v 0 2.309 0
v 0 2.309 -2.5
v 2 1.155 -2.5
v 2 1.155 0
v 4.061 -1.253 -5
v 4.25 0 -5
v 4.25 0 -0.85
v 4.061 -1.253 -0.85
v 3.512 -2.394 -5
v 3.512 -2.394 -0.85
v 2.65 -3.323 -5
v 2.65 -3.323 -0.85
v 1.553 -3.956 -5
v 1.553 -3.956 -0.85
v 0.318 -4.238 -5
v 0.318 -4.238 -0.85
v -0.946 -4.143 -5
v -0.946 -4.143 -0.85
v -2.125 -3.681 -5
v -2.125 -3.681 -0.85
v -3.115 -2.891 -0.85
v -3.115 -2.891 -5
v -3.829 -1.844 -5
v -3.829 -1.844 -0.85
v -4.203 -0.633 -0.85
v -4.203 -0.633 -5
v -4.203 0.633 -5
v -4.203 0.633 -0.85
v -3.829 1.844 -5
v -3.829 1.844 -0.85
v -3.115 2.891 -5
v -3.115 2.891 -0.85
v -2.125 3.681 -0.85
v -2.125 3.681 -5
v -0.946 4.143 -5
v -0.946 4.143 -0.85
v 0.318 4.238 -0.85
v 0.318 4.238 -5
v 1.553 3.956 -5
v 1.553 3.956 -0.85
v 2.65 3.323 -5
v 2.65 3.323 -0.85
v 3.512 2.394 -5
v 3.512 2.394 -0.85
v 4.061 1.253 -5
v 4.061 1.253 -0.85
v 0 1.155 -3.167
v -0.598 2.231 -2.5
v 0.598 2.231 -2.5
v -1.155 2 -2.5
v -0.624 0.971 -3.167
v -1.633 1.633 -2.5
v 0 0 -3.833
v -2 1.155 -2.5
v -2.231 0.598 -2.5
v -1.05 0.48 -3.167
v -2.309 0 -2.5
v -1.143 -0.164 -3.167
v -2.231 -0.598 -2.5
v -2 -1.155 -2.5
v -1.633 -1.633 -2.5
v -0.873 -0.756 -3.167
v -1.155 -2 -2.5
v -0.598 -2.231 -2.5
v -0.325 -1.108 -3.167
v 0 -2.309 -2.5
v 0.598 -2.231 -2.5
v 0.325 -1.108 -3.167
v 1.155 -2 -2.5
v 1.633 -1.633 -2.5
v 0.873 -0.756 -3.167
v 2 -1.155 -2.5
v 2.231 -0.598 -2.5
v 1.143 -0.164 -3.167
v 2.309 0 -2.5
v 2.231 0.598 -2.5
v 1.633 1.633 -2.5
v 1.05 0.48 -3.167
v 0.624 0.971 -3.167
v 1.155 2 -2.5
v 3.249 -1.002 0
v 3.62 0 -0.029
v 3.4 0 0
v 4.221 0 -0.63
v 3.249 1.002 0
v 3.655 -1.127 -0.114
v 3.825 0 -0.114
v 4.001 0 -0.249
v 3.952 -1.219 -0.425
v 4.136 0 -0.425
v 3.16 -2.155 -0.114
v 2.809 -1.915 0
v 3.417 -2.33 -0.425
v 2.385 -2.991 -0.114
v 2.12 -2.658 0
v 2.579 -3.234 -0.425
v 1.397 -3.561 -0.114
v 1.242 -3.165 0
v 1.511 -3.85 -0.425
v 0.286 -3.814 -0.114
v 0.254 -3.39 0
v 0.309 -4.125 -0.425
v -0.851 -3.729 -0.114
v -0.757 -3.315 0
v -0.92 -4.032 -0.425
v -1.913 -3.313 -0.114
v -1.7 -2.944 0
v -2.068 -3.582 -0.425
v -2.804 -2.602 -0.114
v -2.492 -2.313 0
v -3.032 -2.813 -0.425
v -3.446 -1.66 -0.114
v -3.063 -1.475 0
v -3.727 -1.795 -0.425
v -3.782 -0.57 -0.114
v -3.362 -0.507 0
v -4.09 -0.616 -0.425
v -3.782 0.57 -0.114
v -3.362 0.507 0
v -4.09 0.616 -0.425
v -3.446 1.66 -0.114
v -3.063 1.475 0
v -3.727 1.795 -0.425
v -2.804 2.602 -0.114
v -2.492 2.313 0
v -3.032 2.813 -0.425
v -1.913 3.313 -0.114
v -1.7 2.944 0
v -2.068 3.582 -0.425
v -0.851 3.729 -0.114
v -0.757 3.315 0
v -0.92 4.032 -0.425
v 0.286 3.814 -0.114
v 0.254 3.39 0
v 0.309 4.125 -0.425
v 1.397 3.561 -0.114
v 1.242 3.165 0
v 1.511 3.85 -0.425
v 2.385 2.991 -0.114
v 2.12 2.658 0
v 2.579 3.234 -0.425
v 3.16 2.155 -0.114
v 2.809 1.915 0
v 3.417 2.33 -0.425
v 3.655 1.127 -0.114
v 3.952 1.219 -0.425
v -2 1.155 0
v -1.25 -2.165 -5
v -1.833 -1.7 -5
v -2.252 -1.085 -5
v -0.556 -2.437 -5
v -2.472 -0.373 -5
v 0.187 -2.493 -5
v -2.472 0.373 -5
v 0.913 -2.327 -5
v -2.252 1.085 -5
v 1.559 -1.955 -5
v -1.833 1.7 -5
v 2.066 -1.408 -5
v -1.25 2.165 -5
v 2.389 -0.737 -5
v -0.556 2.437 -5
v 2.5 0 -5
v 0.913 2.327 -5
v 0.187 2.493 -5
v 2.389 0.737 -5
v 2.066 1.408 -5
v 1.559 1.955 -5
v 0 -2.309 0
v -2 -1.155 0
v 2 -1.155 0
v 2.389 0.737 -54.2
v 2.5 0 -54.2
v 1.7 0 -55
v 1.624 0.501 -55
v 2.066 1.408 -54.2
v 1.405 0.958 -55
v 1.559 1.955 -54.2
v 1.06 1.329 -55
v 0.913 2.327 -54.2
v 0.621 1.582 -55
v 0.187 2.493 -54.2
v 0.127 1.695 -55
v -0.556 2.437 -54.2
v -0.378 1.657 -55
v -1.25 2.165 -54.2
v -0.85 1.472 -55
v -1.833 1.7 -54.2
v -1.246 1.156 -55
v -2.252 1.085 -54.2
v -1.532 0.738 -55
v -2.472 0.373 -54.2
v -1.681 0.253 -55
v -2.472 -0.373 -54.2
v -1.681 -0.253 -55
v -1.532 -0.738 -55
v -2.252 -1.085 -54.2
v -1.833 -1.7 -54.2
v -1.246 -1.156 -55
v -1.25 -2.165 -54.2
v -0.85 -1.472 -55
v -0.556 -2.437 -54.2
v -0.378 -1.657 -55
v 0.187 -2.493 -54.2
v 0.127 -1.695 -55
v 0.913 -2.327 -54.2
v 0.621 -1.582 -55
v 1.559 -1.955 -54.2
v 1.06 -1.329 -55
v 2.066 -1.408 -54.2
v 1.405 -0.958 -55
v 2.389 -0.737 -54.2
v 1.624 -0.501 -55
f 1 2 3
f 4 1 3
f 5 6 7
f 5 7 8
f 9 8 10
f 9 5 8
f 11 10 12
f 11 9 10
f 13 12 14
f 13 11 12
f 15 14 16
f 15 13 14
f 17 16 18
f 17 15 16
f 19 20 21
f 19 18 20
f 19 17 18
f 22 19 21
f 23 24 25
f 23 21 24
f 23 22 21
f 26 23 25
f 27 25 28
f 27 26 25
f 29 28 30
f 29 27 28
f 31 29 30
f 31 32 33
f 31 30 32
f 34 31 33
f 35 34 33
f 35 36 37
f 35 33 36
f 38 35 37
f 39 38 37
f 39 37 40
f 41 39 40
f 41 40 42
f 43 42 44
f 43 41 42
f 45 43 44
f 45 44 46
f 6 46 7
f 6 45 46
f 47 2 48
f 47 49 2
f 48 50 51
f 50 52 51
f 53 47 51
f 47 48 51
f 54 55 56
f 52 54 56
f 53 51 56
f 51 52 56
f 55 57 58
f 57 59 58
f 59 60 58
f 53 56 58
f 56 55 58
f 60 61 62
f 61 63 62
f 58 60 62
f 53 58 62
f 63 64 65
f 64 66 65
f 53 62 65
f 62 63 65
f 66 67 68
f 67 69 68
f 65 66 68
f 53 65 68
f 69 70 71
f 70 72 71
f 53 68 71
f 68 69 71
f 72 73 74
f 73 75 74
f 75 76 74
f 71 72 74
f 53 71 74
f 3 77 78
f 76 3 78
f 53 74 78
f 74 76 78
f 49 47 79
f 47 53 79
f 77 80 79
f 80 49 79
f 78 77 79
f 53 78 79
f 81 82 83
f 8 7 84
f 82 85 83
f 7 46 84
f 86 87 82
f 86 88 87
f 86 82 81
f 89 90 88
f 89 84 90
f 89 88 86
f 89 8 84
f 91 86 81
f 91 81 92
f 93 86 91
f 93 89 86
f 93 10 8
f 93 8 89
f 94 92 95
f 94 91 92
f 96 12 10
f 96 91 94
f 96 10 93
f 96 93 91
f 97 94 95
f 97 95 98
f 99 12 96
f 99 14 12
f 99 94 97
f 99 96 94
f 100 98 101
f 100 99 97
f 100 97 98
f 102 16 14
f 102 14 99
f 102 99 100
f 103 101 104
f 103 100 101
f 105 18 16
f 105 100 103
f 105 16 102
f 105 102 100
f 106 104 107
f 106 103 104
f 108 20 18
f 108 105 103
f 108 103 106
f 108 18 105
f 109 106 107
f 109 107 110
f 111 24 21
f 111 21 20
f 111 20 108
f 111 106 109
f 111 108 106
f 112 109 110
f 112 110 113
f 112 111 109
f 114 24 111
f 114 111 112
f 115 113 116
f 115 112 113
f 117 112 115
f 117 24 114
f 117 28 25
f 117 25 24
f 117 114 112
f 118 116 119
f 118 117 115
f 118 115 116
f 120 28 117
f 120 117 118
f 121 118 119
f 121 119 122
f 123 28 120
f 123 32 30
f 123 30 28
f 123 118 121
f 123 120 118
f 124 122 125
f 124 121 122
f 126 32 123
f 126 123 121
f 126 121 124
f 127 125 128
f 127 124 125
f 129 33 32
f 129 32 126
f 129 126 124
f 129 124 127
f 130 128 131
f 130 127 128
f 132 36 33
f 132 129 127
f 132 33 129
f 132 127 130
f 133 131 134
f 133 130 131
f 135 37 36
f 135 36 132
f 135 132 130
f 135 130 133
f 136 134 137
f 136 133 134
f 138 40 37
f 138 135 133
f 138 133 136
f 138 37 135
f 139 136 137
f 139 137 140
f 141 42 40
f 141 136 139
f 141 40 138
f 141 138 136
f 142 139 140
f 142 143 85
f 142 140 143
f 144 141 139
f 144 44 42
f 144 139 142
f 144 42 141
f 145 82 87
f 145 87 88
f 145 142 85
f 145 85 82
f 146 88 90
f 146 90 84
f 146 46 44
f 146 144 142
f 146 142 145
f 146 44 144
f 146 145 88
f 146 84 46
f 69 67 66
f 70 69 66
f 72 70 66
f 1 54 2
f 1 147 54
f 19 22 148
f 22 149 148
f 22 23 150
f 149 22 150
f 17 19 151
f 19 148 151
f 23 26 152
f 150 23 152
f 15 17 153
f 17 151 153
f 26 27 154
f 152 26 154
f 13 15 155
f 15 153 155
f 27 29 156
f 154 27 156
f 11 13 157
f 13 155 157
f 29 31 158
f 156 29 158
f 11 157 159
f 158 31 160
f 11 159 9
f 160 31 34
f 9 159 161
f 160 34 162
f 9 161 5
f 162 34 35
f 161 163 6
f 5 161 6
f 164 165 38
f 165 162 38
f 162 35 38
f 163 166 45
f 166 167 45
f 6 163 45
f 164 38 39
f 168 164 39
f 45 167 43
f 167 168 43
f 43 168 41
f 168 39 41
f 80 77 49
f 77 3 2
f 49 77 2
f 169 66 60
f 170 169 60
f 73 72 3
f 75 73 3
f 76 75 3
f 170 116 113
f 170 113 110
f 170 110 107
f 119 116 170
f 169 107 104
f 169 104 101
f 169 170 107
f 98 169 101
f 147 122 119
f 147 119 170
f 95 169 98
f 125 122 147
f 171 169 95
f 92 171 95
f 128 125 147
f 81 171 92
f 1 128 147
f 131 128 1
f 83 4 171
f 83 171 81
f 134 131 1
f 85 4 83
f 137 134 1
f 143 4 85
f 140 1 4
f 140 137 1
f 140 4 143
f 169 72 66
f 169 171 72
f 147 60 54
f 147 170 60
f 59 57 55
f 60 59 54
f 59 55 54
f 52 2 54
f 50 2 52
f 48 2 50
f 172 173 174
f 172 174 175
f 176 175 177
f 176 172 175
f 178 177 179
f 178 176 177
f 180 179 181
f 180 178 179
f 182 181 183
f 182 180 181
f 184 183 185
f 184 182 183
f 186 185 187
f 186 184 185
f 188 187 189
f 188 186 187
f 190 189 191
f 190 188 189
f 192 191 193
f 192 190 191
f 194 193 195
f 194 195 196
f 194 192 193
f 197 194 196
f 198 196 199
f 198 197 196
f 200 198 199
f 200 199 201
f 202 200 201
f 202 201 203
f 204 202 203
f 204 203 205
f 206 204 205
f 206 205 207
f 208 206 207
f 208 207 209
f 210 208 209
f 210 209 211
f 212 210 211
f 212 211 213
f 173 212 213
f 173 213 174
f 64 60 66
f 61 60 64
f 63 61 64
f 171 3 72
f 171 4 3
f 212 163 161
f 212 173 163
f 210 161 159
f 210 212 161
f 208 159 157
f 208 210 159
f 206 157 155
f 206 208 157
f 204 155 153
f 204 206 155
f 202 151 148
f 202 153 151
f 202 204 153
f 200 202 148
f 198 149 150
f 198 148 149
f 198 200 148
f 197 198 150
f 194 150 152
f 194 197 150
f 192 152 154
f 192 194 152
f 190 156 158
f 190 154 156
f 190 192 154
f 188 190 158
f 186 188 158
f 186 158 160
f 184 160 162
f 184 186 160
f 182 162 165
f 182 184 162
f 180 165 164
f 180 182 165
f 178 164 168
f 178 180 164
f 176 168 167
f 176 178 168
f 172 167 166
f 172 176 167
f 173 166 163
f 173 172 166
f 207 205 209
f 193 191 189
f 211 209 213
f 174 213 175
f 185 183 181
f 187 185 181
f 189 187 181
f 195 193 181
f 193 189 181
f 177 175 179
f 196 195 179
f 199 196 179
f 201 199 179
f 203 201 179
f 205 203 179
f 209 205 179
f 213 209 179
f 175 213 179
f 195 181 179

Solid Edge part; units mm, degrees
sketch "Sketch1" plane through (0, 0, 0) normal (0, -1, 0) x (1, 0, 0)
  line L0 (0, 0) -> (3.4, 0)
  arc A0 (3.4, 0) -> (4.25, -0.85) centre (3.4, -0.85) cw
  line L1 (4.25, -0.85) -> (4.25, -5)
  line L2 (4.25, -5) -> (2.5, -5)
  line L3 (2.5, -5) -> (2.5, -54.2)
  line L4 (2.5, -54.2) -> (1.7, -55)
  line L5 (1.7, -55) -> (0, -55)
revolve "RevolvedProtrusion1" add sketch "Sketch1" angle 360 about axis through (0, 0, -55) along (0, 0, 1)
sketch "Sketch2" plane through (0, 0, 0) normal (0, 0, 1) x (1, 0, 0)
  line L0 (-2, -1.1547) -> (-2, 1.1547)
  line L1 (-2, 1.1547) -> (0, 2.3094)
  line L2 (0, 2.3094) -> (2, 1.1547)
  line L3 (2, 1.1547) -> (2, -1.1547)
  line L4 (2, -1.1547) -> (0, -2.3094)
  line L5 (0, -2.3094) -> (-2, -1.1547)
extrude "Cutout1" cut sketch "Sketch2" against normal blind 2.5
sketch "Sketch3" plane through (0, 0, 0) normal (1, 0, 0) x (0, 1, 0)
  line L0 (0, -3.8333) -> (2.3094, -2.5)
  line L1 (0, -2.5) -> (2.3094, -2.5)
  line L2 (0, -2.5) -> (0, -3.8333)
revolve "RevolvedCutout1" cut sketch "Sketch3" angle 360 about axis through (0, 0, -60.325) along (0, 0, 1)
cosmetic_thread "Thread1" size "M5"
